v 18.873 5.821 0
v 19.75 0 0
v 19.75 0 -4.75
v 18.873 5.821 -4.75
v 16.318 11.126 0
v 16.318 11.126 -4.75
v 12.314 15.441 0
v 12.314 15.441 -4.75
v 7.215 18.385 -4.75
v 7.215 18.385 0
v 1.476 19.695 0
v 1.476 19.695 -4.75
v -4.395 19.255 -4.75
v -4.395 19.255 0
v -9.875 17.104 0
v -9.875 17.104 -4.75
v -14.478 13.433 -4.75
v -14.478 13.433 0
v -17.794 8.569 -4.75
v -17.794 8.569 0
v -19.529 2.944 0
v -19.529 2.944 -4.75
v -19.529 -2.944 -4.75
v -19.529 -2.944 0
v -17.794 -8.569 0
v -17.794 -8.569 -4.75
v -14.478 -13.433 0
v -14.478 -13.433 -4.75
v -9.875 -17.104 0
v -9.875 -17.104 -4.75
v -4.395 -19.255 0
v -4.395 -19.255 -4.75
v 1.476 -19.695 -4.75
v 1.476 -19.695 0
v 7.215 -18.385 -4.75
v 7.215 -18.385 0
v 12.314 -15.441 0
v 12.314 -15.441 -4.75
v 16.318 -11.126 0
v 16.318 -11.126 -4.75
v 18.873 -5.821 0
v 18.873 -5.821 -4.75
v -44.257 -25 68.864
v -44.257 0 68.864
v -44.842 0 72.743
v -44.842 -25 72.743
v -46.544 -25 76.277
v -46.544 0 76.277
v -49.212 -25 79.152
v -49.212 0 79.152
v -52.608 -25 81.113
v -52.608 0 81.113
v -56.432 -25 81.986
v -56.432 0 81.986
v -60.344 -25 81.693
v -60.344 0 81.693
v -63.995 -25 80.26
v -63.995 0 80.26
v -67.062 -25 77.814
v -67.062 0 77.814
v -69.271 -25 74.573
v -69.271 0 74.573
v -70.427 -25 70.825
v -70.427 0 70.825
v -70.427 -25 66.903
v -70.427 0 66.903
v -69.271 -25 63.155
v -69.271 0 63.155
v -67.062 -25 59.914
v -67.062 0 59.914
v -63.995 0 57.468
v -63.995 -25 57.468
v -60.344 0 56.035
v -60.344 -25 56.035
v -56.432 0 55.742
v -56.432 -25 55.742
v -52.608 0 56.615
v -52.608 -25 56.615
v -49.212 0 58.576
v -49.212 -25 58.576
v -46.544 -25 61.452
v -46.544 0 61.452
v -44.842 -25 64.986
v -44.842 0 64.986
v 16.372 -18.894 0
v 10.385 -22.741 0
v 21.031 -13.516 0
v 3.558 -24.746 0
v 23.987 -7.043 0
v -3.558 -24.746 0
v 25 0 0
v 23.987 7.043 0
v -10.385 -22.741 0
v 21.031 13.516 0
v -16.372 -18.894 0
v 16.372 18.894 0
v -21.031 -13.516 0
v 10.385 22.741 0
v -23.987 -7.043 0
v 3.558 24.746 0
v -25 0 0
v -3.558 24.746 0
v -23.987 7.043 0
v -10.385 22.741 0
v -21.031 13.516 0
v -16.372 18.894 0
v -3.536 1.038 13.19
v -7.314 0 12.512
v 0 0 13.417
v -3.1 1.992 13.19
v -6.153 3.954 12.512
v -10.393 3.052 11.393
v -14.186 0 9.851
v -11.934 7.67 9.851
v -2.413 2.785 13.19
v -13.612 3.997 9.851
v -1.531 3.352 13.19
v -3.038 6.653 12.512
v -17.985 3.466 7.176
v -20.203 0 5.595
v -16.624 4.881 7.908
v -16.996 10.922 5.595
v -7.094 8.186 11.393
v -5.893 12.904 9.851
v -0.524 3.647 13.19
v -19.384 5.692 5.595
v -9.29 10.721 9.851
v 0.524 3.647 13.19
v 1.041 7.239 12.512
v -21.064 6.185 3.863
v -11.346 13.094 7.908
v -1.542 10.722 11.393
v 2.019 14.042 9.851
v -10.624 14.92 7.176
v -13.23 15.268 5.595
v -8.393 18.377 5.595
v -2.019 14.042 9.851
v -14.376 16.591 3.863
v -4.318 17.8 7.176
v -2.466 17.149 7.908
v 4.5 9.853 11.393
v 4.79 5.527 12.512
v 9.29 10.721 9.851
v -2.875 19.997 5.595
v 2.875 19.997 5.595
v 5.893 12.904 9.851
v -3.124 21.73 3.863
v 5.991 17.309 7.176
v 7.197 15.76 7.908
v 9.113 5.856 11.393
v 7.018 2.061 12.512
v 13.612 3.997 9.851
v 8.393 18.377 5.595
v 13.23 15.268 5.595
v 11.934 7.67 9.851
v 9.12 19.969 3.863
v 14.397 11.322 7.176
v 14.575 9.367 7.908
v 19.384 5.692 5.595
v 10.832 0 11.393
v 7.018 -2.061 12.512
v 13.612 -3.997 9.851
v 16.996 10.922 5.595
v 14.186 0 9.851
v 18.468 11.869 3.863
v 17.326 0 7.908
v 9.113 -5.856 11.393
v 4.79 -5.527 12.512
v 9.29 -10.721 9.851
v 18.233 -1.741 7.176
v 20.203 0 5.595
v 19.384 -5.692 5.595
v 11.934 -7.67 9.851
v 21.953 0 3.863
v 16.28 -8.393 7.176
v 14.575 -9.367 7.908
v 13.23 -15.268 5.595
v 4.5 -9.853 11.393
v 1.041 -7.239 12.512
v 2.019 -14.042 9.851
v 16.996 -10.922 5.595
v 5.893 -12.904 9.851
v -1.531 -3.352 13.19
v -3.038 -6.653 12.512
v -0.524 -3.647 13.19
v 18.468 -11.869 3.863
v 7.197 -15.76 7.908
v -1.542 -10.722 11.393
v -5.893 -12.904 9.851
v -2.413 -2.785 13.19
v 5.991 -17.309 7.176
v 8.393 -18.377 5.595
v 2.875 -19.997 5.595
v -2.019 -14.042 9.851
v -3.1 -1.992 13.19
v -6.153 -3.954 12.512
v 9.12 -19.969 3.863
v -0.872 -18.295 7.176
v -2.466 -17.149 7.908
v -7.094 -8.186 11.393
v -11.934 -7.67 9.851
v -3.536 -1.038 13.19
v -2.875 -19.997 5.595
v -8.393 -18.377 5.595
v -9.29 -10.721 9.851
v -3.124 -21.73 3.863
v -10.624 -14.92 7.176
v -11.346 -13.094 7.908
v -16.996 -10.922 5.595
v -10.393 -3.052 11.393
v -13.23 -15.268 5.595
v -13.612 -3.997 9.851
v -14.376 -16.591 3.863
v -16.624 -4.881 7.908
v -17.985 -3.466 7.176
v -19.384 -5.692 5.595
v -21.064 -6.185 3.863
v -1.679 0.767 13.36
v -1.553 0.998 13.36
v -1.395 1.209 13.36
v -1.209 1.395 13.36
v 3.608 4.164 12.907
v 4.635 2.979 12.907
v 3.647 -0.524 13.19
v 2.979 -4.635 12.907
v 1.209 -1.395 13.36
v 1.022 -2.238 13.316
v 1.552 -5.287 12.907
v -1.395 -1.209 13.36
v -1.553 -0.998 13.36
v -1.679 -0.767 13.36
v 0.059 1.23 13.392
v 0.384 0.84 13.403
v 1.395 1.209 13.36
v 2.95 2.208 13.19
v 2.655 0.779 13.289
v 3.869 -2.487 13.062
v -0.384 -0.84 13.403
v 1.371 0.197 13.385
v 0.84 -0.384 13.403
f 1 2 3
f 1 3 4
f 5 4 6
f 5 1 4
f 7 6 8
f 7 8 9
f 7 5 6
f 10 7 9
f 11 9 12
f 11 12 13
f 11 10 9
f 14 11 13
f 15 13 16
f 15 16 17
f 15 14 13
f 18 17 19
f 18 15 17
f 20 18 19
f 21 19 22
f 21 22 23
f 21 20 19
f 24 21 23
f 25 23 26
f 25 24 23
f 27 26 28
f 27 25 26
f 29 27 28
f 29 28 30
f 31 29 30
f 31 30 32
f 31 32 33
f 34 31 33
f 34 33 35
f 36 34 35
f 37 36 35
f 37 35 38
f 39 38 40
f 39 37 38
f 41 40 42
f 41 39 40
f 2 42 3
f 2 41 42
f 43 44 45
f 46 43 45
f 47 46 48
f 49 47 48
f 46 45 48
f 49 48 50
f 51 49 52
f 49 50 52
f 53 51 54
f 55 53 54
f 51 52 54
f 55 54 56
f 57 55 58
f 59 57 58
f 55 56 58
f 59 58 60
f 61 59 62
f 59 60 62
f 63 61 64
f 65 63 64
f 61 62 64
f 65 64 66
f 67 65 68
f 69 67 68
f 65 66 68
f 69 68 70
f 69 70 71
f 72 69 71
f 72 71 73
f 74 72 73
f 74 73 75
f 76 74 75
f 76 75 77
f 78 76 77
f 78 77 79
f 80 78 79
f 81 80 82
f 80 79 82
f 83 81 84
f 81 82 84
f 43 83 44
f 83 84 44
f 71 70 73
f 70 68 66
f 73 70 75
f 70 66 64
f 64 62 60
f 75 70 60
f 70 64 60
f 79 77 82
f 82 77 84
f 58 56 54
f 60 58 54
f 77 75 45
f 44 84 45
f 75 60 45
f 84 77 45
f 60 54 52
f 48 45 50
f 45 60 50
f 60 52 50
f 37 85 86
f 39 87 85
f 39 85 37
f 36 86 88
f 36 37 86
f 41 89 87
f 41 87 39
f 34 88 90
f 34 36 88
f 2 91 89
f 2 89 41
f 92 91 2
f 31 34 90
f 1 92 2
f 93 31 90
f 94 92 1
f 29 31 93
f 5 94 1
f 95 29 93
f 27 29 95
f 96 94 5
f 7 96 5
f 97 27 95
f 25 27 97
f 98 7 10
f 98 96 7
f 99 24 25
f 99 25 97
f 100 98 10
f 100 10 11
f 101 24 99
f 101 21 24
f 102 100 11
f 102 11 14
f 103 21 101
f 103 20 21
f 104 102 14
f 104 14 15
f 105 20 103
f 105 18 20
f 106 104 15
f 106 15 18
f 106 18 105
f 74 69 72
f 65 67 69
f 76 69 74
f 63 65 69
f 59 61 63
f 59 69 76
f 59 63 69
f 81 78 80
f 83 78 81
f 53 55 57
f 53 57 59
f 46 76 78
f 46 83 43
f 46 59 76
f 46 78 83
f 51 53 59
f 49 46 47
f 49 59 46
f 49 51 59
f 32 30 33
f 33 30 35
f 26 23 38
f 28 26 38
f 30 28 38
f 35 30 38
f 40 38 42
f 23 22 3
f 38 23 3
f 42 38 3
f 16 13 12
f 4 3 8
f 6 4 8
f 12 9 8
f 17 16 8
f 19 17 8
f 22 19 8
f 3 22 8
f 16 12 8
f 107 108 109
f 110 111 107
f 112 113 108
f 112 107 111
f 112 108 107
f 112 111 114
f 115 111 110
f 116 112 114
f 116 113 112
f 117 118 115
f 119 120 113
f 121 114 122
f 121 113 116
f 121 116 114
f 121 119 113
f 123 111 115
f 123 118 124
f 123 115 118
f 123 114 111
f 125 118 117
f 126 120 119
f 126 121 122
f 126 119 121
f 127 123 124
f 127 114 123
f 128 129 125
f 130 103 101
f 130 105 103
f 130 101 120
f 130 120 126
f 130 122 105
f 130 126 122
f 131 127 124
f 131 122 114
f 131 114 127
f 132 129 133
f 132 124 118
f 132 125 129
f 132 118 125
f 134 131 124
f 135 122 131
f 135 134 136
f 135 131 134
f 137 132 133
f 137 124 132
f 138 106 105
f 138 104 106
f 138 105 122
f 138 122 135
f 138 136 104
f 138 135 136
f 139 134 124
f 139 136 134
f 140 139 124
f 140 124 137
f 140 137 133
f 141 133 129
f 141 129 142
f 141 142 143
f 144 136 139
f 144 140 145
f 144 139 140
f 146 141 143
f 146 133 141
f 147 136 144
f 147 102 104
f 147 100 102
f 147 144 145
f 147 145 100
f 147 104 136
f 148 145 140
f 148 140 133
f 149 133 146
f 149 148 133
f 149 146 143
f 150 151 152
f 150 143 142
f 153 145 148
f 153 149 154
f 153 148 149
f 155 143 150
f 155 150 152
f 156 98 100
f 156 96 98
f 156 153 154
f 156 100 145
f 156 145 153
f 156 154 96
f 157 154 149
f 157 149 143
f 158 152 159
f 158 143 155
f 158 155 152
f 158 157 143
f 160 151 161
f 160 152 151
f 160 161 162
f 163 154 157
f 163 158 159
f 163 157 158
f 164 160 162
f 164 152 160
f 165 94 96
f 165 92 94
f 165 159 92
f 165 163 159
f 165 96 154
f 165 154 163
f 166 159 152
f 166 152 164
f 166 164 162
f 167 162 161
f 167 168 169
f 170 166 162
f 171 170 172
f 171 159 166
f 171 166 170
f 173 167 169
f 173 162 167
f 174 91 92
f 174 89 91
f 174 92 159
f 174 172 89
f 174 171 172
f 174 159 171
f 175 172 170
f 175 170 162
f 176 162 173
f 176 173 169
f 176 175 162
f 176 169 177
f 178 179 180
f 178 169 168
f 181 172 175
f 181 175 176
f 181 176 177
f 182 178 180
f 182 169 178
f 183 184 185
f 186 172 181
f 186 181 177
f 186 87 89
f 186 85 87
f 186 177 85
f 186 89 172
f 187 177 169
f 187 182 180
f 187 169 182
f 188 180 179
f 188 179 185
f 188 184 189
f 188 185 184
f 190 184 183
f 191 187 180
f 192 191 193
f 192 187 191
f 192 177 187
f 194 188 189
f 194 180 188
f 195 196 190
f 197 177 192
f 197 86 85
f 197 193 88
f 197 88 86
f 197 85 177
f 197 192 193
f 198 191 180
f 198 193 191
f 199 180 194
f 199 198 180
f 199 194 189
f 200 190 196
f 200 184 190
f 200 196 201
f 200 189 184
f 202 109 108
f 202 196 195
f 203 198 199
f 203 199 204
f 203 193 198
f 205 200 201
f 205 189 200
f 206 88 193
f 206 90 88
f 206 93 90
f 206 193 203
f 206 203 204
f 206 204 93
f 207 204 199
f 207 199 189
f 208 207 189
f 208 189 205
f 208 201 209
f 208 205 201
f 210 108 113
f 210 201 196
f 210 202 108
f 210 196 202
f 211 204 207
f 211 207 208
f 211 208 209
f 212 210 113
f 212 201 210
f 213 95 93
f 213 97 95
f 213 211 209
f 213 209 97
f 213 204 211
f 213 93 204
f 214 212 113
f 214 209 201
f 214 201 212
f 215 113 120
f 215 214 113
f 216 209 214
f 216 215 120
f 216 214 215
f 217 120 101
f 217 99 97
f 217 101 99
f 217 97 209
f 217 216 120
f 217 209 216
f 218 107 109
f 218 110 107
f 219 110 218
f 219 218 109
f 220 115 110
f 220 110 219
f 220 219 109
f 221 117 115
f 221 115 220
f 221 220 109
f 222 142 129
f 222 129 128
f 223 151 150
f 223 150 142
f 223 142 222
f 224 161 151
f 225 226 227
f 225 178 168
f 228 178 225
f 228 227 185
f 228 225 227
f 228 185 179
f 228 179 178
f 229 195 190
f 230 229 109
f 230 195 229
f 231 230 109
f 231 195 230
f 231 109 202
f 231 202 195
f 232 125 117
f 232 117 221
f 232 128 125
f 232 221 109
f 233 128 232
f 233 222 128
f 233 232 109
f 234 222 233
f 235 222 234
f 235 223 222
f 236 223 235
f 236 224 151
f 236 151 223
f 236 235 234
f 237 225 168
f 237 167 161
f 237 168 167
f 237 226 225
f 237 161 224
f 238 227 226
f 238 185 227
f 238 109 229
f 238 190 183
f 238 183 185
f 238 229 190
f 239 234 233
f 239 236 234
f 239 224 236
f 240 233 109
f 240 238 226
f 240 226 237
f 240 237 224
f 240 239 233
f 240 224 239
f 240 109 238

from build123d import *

# Parameters (mm, degrees)
F0_R     = 19.75
F1_DEPTH = 4.75
F4_R     = 13.158595
F5_DEPTH = 25


with BuildPart() as f1:
    # F0 (on Top) → F1 (new body)
    with BuildSketch(Plane.XY):
        Circle(F0_R)
    extrude(amount=-F1_DEPTH)

    # F2 (on Front) → F3 (revolve)
    with BuildSketch(Plane.XZ):
        with BuildLine():
            Line((-25, 0), (0, 0))
            Line((0, 0), (0, 13.416876))
            ThreePointArc((0, 13.416876), (-14.186372, 9.850696), (-25, 0))
        make_face()
    revolve(axis=Axis((0, 0, 6.708438), (0, 0, -1)))


with BuildPart() as f5:
    # F4 (on Front) → F5 (new body)
    with BuildSketch(Plane.XZ):
        with Locations((-57.415754, 68.864129)):
            Circle(F4_R)
    extrude(amount=F5_DEPTH)


solid = Compound([f1.part, f5.part])
